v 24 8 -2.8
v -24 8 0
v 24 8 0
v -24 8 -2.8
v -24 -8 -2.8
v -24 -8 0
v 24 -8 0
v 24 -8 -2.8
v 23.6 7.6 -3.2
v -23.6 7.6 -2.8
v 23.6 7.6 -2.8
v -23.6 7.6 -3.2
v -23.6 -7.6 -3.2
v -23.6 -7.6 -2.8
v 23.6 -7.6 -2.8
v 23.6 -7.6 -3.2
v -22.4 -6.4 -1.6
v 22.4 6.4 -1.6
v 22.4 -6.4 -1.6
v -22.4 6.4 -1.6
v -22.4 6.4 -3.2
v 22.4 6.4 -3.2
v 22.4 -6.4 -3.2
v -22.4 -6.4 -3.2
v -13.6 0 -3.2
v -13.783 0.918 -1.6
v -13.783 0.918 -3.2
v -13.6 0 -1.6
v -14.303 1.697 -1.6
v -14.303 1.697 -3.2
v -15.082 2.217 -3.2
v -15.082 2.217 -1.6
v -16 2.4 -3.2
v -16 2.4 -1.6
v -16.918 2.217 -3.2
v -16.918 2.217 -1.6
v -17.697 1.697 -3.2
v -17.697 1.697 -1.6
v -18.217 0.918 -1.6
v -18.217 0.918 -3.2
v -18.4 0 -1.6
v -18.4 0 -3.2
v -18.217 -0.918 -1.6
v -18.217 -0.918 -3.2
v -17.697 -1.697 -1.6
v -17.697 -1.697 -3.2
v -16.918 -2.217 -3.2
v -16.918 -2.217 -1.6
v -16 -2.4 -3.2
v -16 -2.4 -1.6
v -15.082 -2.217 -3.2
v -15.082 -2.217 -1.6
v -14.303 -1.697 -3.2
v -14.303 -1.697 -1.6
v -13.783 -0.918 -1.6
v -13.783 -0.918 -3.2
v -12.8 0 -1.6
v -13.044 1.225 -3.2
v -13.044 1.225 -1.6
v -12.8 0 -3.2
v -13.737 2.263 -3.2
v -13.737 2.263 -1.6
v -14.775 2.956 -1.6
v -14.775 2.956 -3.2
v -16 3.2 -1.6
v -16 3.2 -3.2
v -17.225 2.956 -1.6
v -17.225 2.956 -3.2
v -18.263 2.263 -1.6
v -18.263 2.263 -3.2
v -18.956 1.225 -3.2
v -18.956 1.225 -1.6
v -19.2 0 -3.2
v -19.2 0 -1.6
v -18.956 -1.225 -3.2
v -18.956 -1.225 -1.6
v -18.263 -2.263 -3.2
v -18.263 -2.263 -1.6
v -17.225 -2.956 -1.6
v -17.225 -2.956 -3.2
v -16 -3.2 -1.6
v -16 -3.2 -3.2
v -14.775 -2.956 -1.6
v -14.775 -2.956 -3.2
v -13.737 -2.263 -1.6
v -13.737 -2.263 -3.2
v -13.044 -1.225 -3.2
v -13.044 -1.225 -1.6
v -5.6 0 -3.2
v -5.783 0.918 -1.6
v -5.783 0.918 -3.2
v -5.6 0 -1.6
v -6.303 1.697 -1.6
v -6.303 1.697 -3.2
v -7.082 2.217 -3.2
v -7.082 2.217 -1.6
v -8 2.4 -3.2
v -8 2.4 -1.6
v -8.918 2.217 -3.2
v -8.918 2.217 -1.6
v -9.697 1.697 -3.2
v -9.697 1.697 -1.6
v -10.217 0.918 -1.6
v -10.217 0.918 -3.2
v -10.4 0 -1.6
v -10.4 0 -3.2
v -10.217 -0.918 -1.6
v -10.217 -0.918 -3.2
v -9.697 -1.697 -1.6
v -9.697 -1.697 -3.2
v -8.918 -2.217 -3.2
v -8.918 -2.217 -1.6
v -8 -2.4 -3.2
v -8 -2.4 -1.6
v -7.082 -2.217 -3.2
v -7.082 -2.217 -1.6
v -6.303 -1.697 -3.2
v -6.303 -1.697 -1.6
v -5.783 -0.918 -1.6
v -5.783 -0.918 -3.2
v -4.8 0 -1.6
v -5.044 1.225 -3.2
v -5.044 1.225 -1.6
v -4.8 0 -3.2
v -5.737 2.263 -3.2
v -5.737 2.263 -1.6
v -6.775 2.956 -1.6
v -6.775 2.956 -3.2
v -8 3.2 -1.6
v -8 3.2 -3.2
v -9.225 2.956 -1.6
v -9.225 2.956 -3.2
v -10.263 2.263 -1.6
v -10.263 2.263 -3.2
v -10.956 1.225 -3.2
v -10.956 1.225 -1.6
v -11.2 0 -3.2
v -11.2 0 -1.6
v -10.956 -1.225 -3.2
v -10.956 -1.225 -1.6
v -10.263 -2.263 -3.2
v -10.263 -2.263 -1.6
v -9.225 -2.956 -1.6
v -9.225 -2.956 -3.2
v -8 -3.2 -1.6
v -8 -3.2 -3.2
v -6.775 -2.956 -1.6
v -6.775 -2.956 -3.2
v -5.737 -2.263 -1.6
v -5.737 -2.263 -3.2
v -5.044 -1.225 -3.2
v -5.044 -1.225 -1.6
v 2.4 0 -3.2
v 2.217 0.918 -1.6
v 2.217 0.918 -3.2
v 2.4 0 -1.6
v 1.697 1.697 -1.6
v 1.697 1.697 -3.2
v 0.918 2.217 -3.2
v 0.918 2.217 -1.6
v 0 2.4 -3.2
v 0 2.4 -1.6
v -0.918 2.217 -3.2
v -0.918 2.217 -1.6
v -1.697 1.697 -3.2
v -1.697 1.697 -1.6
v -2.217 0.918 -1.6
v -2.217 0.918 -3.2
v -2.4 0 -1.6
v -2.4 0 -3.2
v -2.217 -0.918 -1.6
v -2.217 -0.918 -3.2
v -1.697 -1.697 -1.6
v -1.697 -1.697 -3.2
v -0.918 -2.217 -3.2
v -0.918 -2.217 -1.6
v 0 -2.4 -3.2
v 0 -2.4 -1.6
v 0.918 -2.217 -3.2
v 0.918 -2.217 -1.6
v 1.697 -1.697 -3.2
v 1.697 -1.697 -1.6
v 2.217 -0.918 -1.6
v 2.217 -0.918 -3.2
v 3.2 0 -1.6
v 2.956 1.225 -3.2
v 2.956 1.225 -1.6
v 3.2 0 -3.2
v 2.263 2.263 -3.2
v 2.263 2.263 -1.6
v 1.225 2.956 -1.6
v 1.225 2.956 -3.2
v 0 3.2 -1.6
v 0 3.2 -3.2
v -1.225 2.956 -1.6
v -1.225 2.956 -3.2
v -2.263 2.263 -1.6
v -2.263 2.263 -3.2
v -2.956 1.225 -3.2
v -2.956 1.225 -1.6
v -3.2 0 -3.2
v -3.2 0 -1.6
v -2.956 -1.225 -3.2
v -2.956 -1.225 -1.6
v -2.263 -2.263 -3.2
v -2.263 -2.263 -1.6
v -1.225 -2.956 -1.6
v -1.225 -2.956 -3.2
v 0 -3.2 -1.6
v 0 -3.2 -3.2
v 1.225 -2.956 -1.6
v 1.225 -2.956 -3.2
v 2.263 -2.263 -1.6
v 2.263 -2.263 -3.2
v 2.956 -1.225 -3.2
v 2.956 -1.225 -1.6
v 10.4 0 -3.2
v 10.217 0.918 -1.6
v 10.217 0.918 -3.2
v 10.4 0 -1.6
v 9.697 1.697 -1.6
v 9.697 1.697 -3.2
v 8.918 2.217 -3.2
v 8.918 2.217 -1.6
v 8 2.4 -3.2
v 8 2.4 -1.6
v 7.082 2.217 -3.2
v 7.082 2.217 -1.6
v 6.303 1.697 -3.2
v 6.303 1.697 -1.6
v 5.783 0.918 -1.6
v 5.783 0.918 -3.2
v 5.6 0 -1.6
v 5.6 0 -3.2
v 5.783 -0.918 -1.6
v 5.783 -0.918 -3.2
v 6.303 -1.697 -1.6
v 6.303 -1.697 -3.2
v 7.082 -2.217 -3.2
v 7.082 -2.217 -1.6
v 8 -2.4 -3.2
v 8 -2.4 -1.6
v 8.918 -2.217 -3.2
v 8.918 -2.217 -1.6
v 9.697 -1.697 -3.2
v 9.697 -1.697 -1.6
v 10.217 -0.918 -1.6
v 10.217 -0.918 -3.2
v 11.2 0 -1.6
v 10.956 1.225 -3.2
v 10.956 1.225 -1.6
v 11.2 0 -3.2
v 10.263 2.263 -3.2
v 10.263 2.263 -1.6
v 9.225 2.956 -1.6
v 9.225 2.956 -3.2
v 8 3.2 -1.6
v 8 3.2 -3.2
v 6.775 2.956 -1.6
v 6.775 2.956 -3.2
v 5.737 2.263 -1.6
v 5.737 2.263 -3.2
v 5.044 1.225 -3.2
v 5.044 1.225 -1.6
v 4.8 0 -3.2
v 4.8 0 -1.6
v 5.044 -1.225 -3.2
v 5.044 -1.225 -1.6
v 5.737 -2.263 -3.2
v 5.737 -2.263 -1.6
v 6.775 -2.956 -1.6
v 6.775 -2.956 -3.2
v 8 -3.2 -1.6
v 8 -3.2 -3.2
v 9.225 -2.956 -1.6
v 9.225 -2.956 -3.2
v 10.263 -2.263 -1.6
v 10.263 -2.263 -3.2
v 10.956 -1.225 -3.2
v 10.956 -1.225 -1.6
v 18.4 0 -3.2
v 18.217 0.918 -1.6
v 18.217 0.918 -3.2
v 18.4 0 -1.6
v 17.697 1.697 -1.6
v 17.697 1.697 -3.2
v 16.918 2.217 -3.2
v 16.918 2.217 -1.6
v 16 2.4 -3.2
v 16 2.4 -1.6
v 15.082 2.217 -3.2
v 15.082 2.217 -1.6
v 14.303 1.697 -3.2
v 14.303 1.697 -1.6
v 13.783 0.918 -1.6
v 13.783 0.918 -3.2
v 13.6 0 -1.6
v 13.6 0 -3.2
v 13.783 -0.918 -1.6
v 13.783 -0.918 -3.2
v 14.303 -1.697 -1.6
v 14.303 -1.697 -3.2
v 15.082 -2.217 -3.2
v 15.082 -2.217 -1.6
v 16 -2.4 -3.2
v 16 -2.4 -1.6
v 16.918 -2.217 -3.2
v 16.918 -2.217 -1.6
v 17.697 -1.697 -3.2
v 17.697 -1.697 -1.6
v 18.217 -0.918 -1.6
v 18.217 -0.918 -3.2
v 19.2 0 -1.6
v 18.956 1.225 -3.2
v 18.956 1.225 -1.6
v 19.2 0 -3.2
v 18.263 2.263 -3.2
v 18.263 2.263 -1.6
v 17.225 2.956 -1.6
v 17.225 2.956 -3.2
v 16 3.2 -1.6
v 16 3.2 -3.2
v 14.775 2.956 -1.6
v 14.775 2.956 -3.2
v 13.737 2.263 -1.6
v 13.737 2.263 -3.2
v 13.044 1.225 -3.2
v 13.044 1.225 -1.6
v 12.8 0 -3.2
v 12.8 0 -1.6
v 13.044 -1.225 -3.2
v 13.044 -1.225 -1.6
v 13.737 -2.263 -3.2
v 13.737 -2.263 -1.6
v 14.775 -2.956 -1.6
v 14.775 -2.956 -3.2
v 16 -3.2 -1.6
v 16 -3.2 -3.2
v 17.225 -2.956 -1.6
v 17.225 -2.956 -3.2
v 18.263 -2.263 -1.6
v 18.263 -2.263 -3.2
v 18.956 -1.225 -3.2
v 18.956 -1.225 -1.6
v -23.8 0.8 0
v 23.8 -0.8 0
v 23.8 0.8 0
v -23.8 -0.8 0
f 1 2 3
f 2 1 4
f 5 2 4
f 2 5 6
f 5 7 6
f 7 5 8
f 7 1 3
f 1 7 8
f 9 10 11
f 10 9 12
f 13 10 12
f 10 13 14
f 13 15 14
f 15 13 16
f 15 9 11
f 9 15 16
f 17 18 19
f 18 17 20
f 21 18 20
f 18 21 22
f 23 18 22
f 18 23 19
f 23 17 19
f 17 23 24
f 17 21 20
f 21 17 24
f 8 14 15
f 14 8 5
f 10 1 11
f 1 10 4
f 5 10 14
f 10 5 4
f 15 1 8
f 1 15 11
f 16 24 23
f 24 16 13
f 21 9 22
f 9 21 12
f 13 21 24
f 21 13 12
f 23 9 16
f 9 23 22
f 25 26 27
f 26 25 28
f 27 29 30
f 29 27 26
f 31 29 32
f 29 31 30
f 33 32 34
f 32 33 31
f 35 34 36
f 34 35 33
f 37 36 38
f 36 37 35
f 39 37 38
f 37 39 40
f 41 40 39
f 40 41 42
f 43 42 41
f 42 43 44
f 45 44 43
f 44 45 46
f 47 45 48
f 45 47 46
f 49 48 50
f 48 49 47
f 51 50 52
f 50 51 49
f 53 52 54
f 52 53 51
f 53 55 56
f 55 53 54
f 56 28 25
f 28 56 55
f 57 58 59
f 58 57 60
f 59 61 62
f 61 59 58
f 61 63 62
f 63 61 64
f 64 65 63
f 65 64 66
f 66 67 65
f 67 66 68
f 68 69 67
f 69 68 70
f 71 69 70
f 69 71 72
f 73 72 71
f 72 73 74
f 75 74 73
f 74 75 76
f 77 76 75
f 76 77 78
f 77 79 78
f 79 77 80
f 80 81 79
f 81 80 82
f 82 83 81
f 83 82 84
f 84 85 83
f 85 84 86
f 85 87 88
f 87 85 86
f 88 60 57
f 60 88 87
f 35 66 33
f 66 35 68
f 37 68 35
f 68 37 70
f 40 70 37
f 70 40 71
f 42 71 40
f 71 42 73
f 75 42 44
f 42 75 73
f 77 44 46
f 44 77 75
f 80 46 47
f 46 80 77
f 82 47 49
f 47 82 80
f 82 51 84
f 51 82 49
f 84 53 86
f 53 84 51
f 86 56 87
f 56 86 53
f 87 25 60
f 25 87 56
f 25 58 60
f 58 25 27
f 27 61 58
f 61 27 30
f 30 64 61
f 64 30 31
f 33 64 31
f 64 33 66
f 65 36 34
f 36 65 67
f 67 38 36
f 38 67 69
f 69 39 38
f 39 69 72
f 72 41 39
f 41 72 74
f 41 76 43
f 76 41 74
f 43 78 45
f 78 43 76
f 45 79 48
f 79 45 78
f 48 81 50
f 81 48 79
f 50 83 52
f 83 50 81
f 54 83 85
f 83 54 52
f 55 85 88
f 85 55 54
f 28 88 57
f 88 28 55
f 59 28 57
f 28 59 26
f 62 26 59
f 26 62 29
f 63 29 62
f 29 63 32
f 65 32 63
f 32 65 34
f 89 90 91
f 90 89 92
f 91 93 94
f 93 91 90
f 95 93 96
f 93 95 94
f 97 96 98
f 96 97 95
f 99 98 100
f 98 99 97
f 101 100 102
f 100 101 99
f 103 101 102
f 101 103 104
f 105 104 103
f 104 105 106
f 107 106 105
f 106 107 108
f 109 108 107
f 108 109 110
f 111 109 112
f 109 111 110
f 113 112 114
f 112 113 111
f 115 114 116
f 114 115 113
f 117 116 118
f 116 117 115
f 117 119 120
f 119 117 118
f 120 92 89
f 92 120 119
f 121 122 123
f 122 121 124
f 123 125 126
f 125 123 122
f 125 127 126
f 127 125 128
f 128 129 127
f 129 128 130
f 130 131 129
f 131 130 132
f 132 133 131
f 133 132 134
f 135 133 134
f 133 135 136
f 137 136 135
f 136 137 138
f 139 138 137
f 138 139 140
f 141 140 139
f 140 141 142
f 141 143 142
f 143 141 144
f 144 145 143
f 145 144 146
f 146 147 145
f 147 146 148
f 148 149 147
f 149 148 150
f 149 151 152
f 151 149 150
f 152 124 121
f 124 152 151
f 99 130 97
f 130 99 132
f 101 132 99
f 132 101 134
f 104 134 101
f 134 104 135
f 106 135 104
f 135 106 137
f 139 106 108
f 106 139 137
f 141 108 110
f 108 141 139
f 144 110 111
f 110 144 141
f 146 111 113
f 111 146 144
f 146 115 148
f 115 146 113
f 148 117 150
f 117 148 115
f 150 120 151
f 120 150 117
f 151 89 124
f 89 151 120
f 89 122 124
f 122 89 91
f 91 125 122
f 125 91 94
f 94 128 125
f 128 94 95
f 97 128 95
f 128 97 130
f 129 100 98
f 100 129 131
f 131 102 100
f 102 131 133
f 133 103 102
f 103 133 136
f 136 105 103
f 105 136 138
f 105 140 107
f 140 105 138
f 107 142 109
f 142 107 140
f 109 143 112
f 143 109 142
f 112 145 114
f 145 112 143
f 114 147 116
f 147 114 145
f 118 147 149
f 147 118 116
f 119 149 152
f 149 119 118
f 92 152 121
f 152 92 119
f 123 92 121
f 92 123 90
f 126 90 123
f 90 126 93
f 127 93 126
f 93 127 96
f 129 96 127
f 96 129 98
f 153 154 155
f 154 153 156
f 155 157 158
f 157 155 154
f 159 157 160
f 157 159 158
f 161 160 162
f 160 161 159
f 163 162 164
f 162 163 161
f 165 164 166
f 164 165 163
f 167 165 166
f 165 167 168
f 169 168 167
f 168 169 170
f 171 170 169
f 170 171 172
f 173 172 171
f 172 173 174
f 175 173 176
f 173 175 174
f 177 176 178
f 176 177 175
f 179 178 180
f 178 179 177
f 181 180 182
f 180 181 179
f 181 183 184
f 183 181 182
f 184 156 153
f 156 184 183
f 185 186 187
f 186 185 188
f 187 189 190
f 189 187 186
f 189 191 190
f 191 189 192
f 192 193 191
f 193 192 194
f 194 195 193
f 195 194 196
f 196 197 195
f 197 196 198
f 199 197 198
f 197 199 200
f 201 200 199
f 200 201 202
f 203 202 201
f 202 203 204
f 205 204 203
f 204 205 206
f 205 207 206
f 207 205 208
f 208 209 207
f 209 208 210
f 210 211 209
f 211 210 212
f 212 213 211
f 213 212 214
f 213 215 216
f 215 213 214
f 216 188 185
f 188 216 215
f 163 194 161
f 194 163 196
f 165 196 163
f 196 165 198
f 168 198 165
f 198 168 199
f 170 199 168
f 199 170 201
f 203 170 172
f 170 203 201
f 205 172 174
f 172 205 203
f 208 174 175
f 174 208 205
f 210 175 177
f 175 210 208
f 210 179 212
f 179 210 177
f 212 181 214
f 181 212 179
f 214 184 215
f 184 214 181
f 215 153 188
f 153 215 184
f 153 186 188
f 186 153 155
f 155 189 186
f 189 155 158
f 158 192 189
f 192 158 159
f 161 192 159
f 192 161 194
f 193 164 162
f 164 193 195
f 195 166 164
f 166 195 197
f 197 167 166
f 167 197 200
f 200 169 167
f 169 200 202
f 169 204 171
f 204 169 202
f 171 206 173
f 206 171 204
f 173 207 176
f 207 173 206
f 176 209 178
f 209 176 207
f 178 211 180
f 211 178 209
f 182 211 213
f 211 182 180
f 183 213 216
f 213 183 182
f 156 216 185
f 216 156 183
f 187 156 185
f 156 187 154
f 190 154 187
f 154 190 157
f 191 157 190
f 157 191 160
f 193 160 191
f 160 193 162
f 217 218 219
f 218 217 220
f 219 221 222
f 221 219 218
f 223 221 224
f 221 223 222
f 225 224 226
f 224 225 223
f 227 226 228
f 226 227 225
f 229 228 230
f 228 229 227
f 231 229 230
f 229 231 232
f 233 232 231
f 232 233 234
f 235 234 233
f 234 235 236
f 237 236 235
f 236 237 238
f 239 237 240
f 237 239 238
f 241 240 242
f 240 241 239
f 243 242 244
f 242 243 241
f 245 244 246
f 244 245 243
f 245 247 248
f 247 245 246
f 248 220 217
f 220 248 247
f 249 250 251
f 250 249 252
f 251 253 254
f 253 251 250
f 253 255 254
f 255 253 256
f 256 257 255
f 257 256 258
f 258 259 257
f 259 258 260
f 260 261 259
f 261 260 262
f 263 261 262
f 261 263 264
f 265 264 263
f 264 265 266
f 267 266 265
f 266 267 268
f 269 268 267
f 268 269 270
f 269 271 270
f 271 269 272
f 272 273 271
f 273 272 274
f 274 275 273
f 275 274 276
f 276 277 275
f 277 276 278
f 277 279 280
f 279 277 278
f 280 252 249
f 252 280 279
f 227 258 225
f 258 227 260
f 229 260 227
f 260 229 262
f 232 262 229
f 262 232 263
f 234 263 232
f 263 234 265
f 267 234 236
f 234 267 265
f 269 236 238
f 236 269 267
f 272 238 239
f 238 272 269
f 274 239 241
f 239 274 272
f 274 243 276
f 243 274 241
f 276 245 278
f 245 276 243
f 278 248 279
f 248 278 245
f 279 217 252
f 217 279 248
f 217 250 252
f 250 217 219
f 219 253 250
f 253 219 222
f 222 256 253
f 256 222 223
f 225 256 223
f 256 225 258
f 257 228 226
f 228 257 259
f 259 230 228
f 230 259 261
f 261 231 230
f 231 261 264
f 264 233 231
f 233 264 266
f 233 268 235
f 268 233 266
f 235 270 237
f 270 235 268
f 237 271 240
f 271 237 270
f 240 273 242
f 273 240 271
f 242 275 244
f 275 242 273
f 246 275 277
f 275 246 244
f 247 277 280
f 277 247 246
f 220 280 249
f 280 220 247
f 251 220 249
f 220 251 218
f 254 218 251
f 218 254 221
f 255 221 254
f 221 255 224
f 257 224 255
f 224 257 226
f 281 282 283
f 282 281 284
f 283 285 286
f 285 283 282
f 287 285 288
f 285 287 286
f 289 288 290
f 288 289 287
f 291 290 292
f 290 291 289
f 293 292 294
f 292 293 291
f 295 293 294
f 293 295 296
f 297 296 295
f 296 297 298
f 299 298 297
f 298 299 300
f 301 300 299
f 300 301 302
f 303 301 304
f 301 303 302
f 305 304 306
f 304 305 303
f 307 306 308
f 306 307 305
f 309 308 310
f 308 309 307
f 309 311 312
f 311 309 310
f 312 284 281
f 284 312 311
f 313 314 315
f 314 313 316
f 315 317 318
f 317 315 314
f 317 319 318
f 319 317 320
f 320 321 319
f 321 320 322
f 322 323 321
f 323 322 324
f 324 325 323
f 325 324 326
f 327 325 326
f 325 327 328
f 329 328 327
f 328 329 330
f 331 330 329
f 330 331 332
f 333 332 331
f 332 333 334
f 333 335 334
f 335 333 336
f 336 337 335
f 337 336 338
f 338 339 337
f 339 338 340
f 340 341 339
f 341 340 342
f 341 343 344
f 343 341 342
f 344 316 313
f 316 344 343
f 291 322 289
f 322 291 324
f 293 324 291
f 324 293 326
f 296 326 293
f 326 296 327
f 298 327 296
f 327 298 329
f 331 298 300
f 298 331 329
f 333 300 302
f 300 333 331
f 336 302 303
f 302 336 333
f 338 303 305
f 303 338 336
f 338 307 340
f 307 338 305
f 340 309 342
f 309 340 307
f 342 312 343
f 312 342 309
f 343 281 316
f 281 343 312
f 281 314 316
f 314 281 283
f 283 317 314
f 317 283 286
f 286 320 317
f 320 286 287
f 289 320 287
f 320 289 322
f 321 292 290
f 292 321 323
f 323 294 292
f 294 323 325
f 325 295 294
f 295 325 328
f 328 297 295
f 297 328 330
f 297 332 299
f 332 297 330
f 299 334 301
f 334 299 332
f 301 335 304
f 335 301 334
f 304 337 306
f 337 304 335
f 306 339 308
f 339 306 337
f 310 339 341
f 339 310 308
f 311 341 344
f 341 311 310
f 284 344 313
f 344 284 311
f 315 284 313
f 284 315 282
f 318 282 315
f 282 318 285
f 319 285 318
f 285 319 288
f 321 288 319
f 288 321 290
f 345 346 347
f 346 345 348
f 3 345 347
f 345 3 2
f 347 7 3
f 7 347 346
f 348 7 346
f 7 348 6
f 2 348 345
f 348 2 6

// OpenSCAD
// file: ../p/4-4ring3.scad
use <../lib.scad>
$fa=1; $fs=0.2;
function ldraw_lib__4_4ring3(realsolid=false) = [
// 0 Ring  3 x 1.0
// 0 Name: 4-4ring3.dat
// 0 Author: James Jessiman
// 0 !LDRAW_ORG Primitive UPDATE 2009-01
// 0 !LICENSE Licensed under CC BY 2.0 and CC BY 4.0 : see CAreadme.txt
// 
// 0 BFC CERTIFY CCW
  [0,"BFC","CERTIFY"],
  [0,"BFC","CCW"],
// 
// 0 !HISTORY 1998-12-15 [PTadmin] Official Update 1998-10
// 0 !HISTORY 2002-04-05 [hafhead] Added BFC statement
// 0 !HISTORY 2002-04-25 [PTadmin] Official Update 2002-02
// 0 !HISTORY 2007-06-24 [PTadmin] Header formatted for Contributor Agreement
// 0 !HISTORY 2008-07-01 [PTadmin] Official Update 2008-01
// 0 !HISTORY 2008-08-26 [cwdee] Switch polygon winding and rename
// 0 !HISTORY 2009-05-02 [PTadmin] Official Update 2009-01
// 
// 
// 4 16 -1.5308 0 3.6956 -1.1481 0 2.7717 0 0 3 0 0 4
  [4,16,-1.5308,0,3.6956,-1.1481,0,2.7717,0,0,3,0,0,4],
// 4 16 -2.8284 0 2.8284 -2.1213 0 2.1213 -1.1481 0 2.7717 -1.5308 0 3.6956
  [4,16,-2.8284,0,2.8284,-2.1213,0,2.1213,-1.1481,0,2.7717,-1.5308,0,3.6956],
// 4 16 -3.6956 0 1.5308 -2.7717 0 1.1481 -2.1213 0 2.1213 -2.8284 0 2.8284
  [4,16,-3.6956,0,1.5308,-2.7717,0,1.1481,-2.1213,0,2.1213,-2.8284,0,2.8284],
// 4 16 -4 0 0 -3 0 0 -2.7717 0 1.1481 -3.6956 0 1.5308
  [4,16,-4,0,0,-3,0,0,-2.7717,0,1.1481,-3.6956,0,1.5308],
// 4 16 -3.6956 0 -1.5308 -2.7717 0 -1.1481 -3 0 0 -4 0 0
  [4,16,-3.6956,0,-1.5308,-2.7717,0,-1.1481,-3,0,0,-4,0,0],
// 4 16 -2.8284 0 -2.8284 -2.1213 0 -2.1213 -2.7717 0 -1.1481 -3.6956 0 -1.5308
  [4,16,-2.8284,0,-2.8284,-2.1213,0,-2.1213,-2.7717,0,-1.1481,-3.6956,0,-1.5308],
// 4 16 -1.5308 0 -3.6956 -1.1481 0 -2.7717 -2.1213 0 -2.1213 -2.8284 0 -2.8284
  [4,16,-1.5308,0,-3.6956,-1.1481,0,-2.7717,-2.1213,0,-2.1213,-2.8284,0,-2.8284],
// 4 16 0 0 -4 0 0 -3 -1.1481 0 -2.7717 -1.5308 0 -3.6956
  [4,16,0,0,-4,0,0,-3,-1.1481,0,-2.7717,-1.5308,0,-3.6956],
// 4 16 1.5308 0 -3.6956 1.1481 0 -2.7717 0 0 -3 0 0 -4
  [4,16,1.5308,0,-3.6956,1.1481,0,-2.7717,0,0,-3,0,0,-4],
// 4 16 2.8284 0 -2.8284 2.1213 0 -2.1213 1.1481 0 -2.7717 1.5308 0 -3.6956
  [4,16,2.8284,0,-2.8284,2.1213,0,-2.1213,1.1481,0,-2.7717,1.5308,0,-3.6956],
// 4 16 3.6956 0 -1.5308 2.7717 0 -1.1481 2.1213 0 -2.1213 2.8284 0 -2.8284
  [4,16,3.6956,0,-1.5308,2.7717,0,-1.1481,2.1213,0,-2.1213,2.8284,0,-2.8284],
// 4 16 4 0 0 3 0 0 2.7717 0 -1.1481 3.6956 0 -1.5308
  [4,16,4,0,0,3,0,0,2.7717,0,-1.1481,3.6956,0,-1.5308],
// 4 16 3.6956 0 1.5308 2.7717 0 1.1481 3 0 0 4 0 0
  [4,16,3.6956,0,1.5308,2.7717,0,1.1481,3,0,0,4,0,0],
// 4 16 2.8284 0 2.8284 2.1213 0 2.1213 2.7717 0 1.1481 3.6956 0 1.5308
  [4,16,2.8284,0,2.8284,2.1213,0,2.1213,2.7717,0,1.1481,3.6956,0,1.5308],
// 4 16 1.5308 0 3.6956 1.1481 0 2.7717 2.1213 0 2.1213 2.8284 0 2.8284
  [4,16,1.5308,0,3.6956,1.1481,0,2.7717,2.1213,0,2.1213,2.8284,0,2.8284],
// 4 16 0 0 4 0 0 3 1.1481 0 2.7717 1.5308 0 3.6956
  [4,16,0,0,4,0,0,3,1.1481,0,2.7717,1.5308,0,3.6956],
// 0
];
module ldraw_lib__4_4ring3(step=0, col=false, unit=2/5, alt=false, line=0.2, solid=!$preview)
    makepoly(ldraw_lib__4_4ring3(solid), step=step, col=col, unit=unit, alt=alt, line=line, solid=solid);
ldraw_lib__4_4ring3(line=0.2);
// file: ../p/4-4edge.scad
use <../lib.scad>
function ldraw_lib__4_4edge() = [
// 0 Circle 1.0
// 0 Name: 4-4edge.dat
// 0 Author: James Jessiman
// 0 !LDRAW_ORG Primitive UPDATE 2017-01
// 0 !LICENSE Licensed under CC BY 2.0 and CC BY 4.0 : see CAreadme.txt
// 
// 0 BFC CERTIFY CCW
  [0,"BFC","CERTIFY"],
  [0,"BFC","CCW"],
// 
// 0 !HISTORY 1998-12-15 [PTadmin] Official Update 1998-10
// 0 !HISTORY 2005-12-28 [PTadmin] Official Update 2005-01
// 0 !HISTORY 2007-06-24 [PTadmin] Header formatted for Contributor Agreement
// 0 !HISTORY 2008-07-01 [PTadmin] Official Update 2008-01
// 0 !HISTORY 2017-01-15 [Steffen] BFCed
// 0 !HISTORY 2017-12-30 [PTadmin] Official Update 2017-01
// 
// 
// 2 24 1 0 0 0.9239 0 0.3827
  [2,24,1,0,0,0.9239,0,0.3827],
// 2 24 0.9239 0 0.3827 0.7071 0 0.7071
  [2,24,0.9239,0,0.3827,0.7071,0,0.7071],
// 2 24 0.7071 0 0.7071 0.3827 0 0.9239
  [2,24,0.7071,0,0.7071,0.3827,0,0.9239],
// 2 24 0.3827 0 0.9239 0 0 1
  [2,24,0.3827,0,0.9239,0,0,1],
// 2 24 0 0 1 -0.3827 0 0.9239
  [2,24,0,0,1,-0.3827,0,0.9239],
// 2 24 -0.3827 0 0.9239 -0.7071 0 0.7071
  [2,24,-0.3827,0,0.9239,-0.7071,0,0.7071],
// 2 24 -0.7071 0 0.7071 -0.9239 0 0.3827
  [2,24,-0.7071,0,0.7071,-0.9239,0,0.3827],
// 2 24 -0.9239 0 0.3827 -1 0 -0
  [2,24,-0.9239,0,0.3827,-1,0,-0],
// 2 24 -1 0 -0 -0.9239 0 -0.3827
  [2,24,-1,0,-0,-0.9239,0,-0.3827],
// 2 24 -0.9239 0 -0.3827 -0.7071 0 -0.7071
  [2,24,-0.9239,0,-0.3827,-0.7071,0,-0.7071],
// 2 24 -0.7071 0 -0.7071 -0.3827 0 -0.9239
  [2,24,-0.7071,0,-0.7071,-0.3827,0,-0.9239],
// 2 24 -0.3827 0 -0.9239 0 0 -1
  [2,24,-0.3827,0,-0.9239,0,0,-1],
// 2 24 0 0 -1 0.3827 0 -0.9239
  [2,24,0,0,-1,0.3827,0,-0.9239],
// 2 24 0.3827 0 -0.9239 0.7071 0 -0.7071
  [2,24,0.3827,0,-0.9239,0.7071,0,-0.7071],
// 2 24 0.7071 0 -0.7071 0.9239 0 -0.3827
  [2,24,0.7071,0,-0.7071,0.9239,0,-0.3827],
// 2 24 0.9239 0 -0.3827 1 0 0
  [2,24,0.9239,0,-0.3827,1,0,0],
];
module ldraw_lib__4_4edge(step=0, col=false, unit=2/5, alt=false, line=0.2, solid=!$preview)
    makepoly(ldraw_lib__4_4edge(), step=step, col=col, unit=unit, alt=alt, line=line, solid=solid);
ldraw_lib__4_4edge(line=0.2);
// file: ../p/4-4cyli.scad
use <../lib.scad>
$fa=1; $fs=0.2;
function ldraw_lib__4_4cyli(realsolid=false) = [
// 0 Cylinder 1.0
// 0 Name: 4-4cyli.dat
// 0 Author: James Jessiman
// 0 !LDRAW_ORG Primitive UPDATE 2005-01
// 0 !LICENSE Licensed under CC BY 2.0 and CC BY 4.0 : see CAreadme.txt
// 
// 0 BFC CERTIFY CCW
  [0,"BFC","CERTIFY"],
  [0,"BFC","CCW"],
// 
// 0 !HISTORY 1998-12-15 [PTadmin] Official Update 1998-10
// 0 !HISTORY 2002-03-23 [sbliss] Added BFC statement; merged headers from files in distributions LDraw 0.27 and Complete.
// 0 !HISTORY 2002-04-25 [PTadmin] Official Update 2002-02
// 0 !HISTORY 2004-12-14 [guyvivan] BFC CCW
// 0 !HISTORY 2005-12-28 [PTadmin] Official Update 2005-01
// 0 !HISTORY 2007-06-24 [PTadmin] Header formatted for Contributor Agreement
// 0 !HISTORY 2008-07-01 [PTadmin] Official Update 2008-01
// 
// 
// 4 16 1 1 0 0.9239 1 0.3827 0.9239 0 0.3827 1 0 0
  [4,16,1,1,0,0.9239,1,0.3827,0.9239,0,0.3827,1,0,0],
// 5 24 1 0 0 1 1 0 0.9239 0 0.3827 0.9239 0 -0.3827
  [5,24,1,0,0,1,1,0,0.9239,0,0.3827,0.9239,0,-0.3827],
// 4 16 0.9239 1 0.3827 0.7071 1 0.7071 0.7071 0 0.7071 0.9239 0 0.3827
  [4,16,0.9239,1,0.3827,0.7071,1,0.7071,0.7071,0,0.7071,0.9239,0,0.3827],
// 5 24 0.9239 0 0.3827 0.9239 1 0.3827 0.7071 0 0.7071 1 0 0
  [5,24,0.9239,0,0.3827,0.9239,1,0.3827,0.7071,0,0.7071,1,0,0],
// 4 16 0.7071 1 0.7071 0.3827 1 0.9239 0.3827 0 0.9239 0.7071 0 0.7071
  [4,16,0.7071,1,0.7071,0.3827,1,0.9239,0.3827,0,0.9239,0.7071,0,0.7071],
// 5 24 0.7071 0 0.7071 0.7071 1 0.7071 0.3827 0 0.9239 0.9239 0 0.3827
  [5,24,0.7071,0,0.7071,0.7071,1,0.7071,0.3827,0,0.9239,0.9239,0,0.3827],
// 4 16 0.3827 1 0.9239 0 1 1 0 0 1 0.3827 0 0.9239
  [4,16,0.3827,1,0.9239,0,1,1,0,0,1,0.3827,0,0.9239],
// 5 24 0.3827 0 0.9239 0.3827 1 0.9239 0 0 1 0.7071 0 0.7071
  [5,24,0.3827,0,0.9239,0.3827,1,0.9239,0,0,1,0.7071,0,0.7071],
// 4 16 0 1 1 -0.3827 1 0.9239 -0.3827 0 0.9239 0 0 1
  [4,16,0,1,1,-0.3827,1,0.9239,-0.3827,0,0.9239,0,0,1],
// 5 24 0 0 1 0 1 1 -0.3827 0 0.9239 0.3827 0 0.9239
  [5,24,0,0,1,0,1,1,-0.3827,0,0.9239,0.3827,0,0.9239],
// 4 16 -0.3827 1 0.9239 -0.7071 1 0.7071 -0.7071 0 0.7071 -0.3827 0 0.9239
  [4,16,-0.3827,1,0.9239,-0.7071,1,0.7071,-0.7071,0,0.7071,-0.3827,0,0.9239],
// 5 24 -0.3827 0 0.9239 -0.3827 1 0.9239 -0.7071 0 0.7071 0 0 1
  [5,24,-0.3827,0,0.9239,-0.3827,1,0.9239,-0.7071,0,0.7071,0,0,1],
// 4 16 -0.7071 1 0.7071 -0.9239 1 0.3827 -0.9239 0 0.3827 -0.7071 0 0.7071
  [4,16,-0.7071,1,0.7071,-0.9239,1,0.3827,-0.9239,0,0.3827,-0.7071,0,0.7071],
// 5 24 -0.7071 0 0.7071 -0.7071 1 0.7071 -0.9239 0 0.3827 -0.3827 0 0.9239
  [5,24,-0.7071,0,0.7071,-0.7071,1,0.7071,-0.9239,0,0.3827,-0.3827,0,0.9239],
// 4 16 -0.9239 1 0.3827 -1 1 0 -1 0 0 -0.9239 0 0.3827
  [4,16,-0.9239,1,0.3827,-1,1,0,-1,0,0,-0.9239,0,0.3827],
// 5 24 -0.9239 0 0.3827 -0.9239 1 0.3827 -1 0 0 -0.7071 0 0.7071
  [5,24,-0.9239,0,0.3827,-0.9239,1,0.3827,-1,0,0,-0.7071,0,0.7071],
// 4 16 -1 1 0 -0.9239 1 -0.3827 -0.9239 0 -0.3827 -1 0 0
  [4,16,-1,1,0,-0.9239,1,-0.3827,-0.9239,0,-0.3827,-1,0,0],
// 5 24 -1 0 0 -1 1 0 -0.9239 0 -0.3827 -0.9239 0 0.3827
  [5,24,-1,0,0,-1,1,0,-0.9239,0,-0.3827,-0.9239,0,0.3827],
// 4 16 -0.9239 1 -0.3827 -0.7071 1 -0.7071 -0.7071 0 -0.7071 -0.9239 0 -0.3827
  [4,16,-0.9239,1,-0.3827,-0.7071,1,-0.7071,-0.7071,0,-0.7071,-0.9239,0,-0.3827],
// 5 24 -0.9239 0 -0.3827 -0.9239 1 -0.3827 -0.7071 0 -0.7071 -1 0 0
  [5,24,-0.9239,0,-0.3827,-0.9239,1,-0.3827,-0.7071,0,-0.7071,-1,0,0],
// 4 16 -0.7071 1 -0.7071 -0.3827 1 -0.9239 -0.3827 0 -0.9239 -0.7071 0 -0.7071
  [4,16,-0.7071,1,-0.7071,-0.3827,1,-0.9239,-0.3827,0,-0.9239,-0.7071,0,-0.7071],
// 5 24 -0.7071 0 -0.7071 -0.7071 1 -0.7071 -0.3827 0 -0.9239 -0.9239 0 -0.3827
  [5,24,-0.7071,0,-0.7071,-0.7071,1,-0.7071,-0.3827,0,-0.9239,-0.9239,0,-0.3827],
// 4 16 -0.3827 1 -0.9239 0 1 -1 0 0 -1 -0.3827 0 -0.9239
  [4,16,-0.3827,1,-0.9239,0,1,-1,0,0,-1,-0.3827,0,-0.9239],
// 5 24 -0.3827 0 -0.9239 -0.3827 1 -0.9239 0 0 -1 -0.7071 0 -0.7071
  [5,24,-0.3827,0,-0.9239,-0.3827,1,-0.9239,0,0,-1,-0.7071,0,-0.7071],
// 4 16 0 1 -1 0.3827 1 -0.9239 0.3827 0 -0.9239 0 0 -1
  [4,16,0,1,-1,0.3827,1,-0.9239,0.3827,0,-0.9239,0,0,-1],
// 5 24 0 0 -1 0 1 -1 0.3827 0 -0.9239 -0.3827 0 -0.9239
  [5,24,0,0,-1,0,1,-1,0.3827,0,-0.9239,-0.3827,0,-0.9239],
// 4 16 0.3827 1 -0.9239 0.7071 1 -0.7071 0.7071 0 -0.7071 0.3827 0 -0.9239
  [4,16,0.3827,1,-0.9239,0.7071,1,-0.7071,0.7071,0,-0.7071,0.3827,0,-0.9239],
// 5 24 0.3827 0 -0.9239 0.3827 1 -0.9239 0.7071 0 -0.7071 0 0 -1
  [5,24,0.3827,0,-0.9239,0.3827,1,-0.9239,0.7071,0,-0.7071,0,0,-1],
// 4 16 0.7071 1 -0.7071 0.9239 1 -0.3827 0.9239 0 -0.3827 0.7071 0 -0.7071
  [4,16,0.7071,1,-0.7071,0.9239,1,-0.3827,0.9239,0,-0.3827,0.7071,0,-0.7071],
// 5 24 0.7071 0 -0.7071 0.7071 1 -0.7071 0.9239 0 -0.3827 0.3827 0 -0.9239
  [5,24,0.7071,0,-0.7071,0.7071,1,-0.7071,0.9239,0,-0.3827,0.3827,0,-0.9239],
// 4 16 0.9239 1 -0.3827 1 1 0 1 0 0 0.9239 0 -0.3827
  [4,16,0.9239,1,-0.3827,1,1,0,1,0,0,0.9239,0,-0.3827],
// 5 24 0.9239 0 -0.3827 0.9239 1 -0.3827 1 0 0 0.7071 0 -0.7071
  [5,24,0.9239,0,-0.3827,0.9239,1,-0.3827,1,0,0,0.7071,0,-0.7071],
// 0
];
module ldraw_lib__4_4cyli(step=0, col=false, unit=2/5, alt=false, line=0.2, solid=!$preview)
    makepoly(ldraw_lib__4_4cyli(solid), step=step, col=col, unit=unit, alt=alt, line=line, solid=solid);
ldraw_lib__4_4cyli(line=0.2);
// file: ../p/stud4.scad
use <../lib.scad>
use <4-4cyli.scad>
use <4-4edge.scad>
use <4-4ring3.scad>
function ldraw_lib__stud4() = [
// 0 Stud Tube Open
// 0 Name: stud4.dat
// 0 Author: James Jessiman
// 0 !LDRAW_ORG Primitive UPDATE 2009-02
// 0 !LICENSE Licensed under CC BY 4.0 : see CAreadme.txt
// 
// 0 BFC CERTIFY CCW
  [0,"BFC","CERTIFY"],
  [0,"BFC","CCW"],
// 
// 0 !HISTORY 1999-07-05 [PTadmin] Official Update 1999-05
// 0 !HISTORY 2002-04-04 [sbliss] Modified for BFC compliance
// 0 !HISTORY 2002-04-25 [PTadmin] Official Update 2002-02
// 0 !HISTORY 2007-06-24 [PTadmin] Header formatted for Contributor Agreement
// 0 !HISTORY 2008-07-01 [PTadmin] Official Update 2008-01
// 0 !HISTORY 2009-06-21 [cwdee] Update ring references to 4-4ring
// 0 !HISTORY 2009-09-03 [PTadmin] Official Update 2009-02
// 
// 
// 1 16 0 -4 0 6 0 0 0 1 0 0 0 6 4-4edge.dat
  [1,16,0,-4,0,6,0,0,0,1,0,0,0,6, ldraw_lib__4_4edge()],
// 1 16 0 -4 0 8 0 0 0 1 0 0 0 8 4-4edge.dat
  [1,16,0,-4,0,8,0,0,0,1,0,0,0,8, ldraw_lib__4_4edge()],
// 1 16 0 0 0 6 0 0 0 1 0 0 0 6 4-4edge.dat
  [1,16,0,0,0,6,0,0,0,1,0,0,0,6, ldraw_lib__4_4edge()],
// 1 16 0 0 0 8 0 0 0 1 0 0 0 8 4-4edge.dat
  [1,16,0,0,0,8,0,0,0,1,0,0,0,8, ldraw_lib__4_4edge()],
// 0 BFC INVERTNEXT
  [0,"BFC","INVERTNEXT"],
// 1 16 0 -4 0 6 0 0 0 4 0 0 0 6 4-4cyli.dat
  [1,16,0,-4,0,6,0,0,0,4,0,0,0,6, ldraw_lib__4_4cyli()],
// 1 16 0 -4 0 8 0 0 0 4 0 0 0 8 4-4cyli.dat
  [1,16,0,-4,0,8,0,0,0,4,0,0,0,8, ldraw_lib__4_4cyli()],
// 1 16 0 -4 0 2 0 0 0 1 0 0 0 2 4-4ring3.dat
  [1,16,0,-4,0,2,0,0,0,1,0,0,0,2, ldraw_lib__4_4ring3()],
  [-1,16,0,0,0,2,0,0,0,-1,0,0,0,2, ldraw_lib__4_4ring3()],
// 0
];
module ldraw_lib__stud4(step=0, col=false, unit=2/5, alt=false, line=0.2, solid=!$preview)
    makepoly(ldraw_lib__stud4(), step=step, col=col, unit=unit, alt=alt, line=line, solid=solid);
ldraw_lib__stud4(line=0.2);
// file: ../p/stug4-1x5.scad
use <../lib.scad>
use <stud4.scad>
function ldraw_lib__stug4_1x5() = [
// 0 Stud Tube Open Group  1 x  5
// 0 Name: stug4-1x5.dat
// 0 Author: Steffen [Steffen]
// 0 !LDRAW_ORG Primitive UPDATE 2011-01
// 0 !LICENSE Licensed under CC BY 2.0 and CC BY 4.0 : see CAreadme.txt
// 
// 0 BFC CERTIFY CCW
  [0,"BFC","CERTIFY"],
  [0,"BFC","CCW"],
// 
// 0 !HISTORY 2011-07-25 [PTadmin] Official Update 2011-01
// 
// 
// 1 16 -40 0 0 1 0 0 0 1 0 0 0 1 stud4.dat
  [1,16,-40,0,0,1,0,0,0,1,0,0,0,1, ldraw_lib__stud4()],
// 1 16 -20 0 0 1 0 0 0 1 0 0 0 1 stud4.dat
  [1,16,-20,0,0,1,0,0,0,1,0,0,0,1, ldraw_lib__stud4()],
// 1 16 0 0 0 1 0 0 0 1 0 0 0 1 stud4.dat
  [1,16,0,0,0,1,0,0,0,1,0,0,0,1, ldraw_lib__stud4()],
// 1 16 20 0 0 1 0 0 0 1 0 0 0 1 stud4.dat
  [1,16,20,0,0,1,0,0,0,1,0,0,0,1, ldraw_lib__stud4()],
// 1 16 40 0 0 1 0 0 0 1 0 0 0 1 stud4.dat
  [1,16,40,0,0,1,0,0,0,1,0,0,0,1, ldraw_lib__stud4()],
];
module ldraw_lib__stug4_1x5(step=0, col=false, unit=2/5, alt=false, line=0.2, solid=!$preview)
    makepoly(ldraw_lib__stug4_1x5(), step=step, col=col, unit=unit, alt=alt, line=line, solid=solid);
ldraw_lib__stug4_1x5(line=0.2);
// file: ../p/box5.scad
use <../lib.scad>
function ldraw_lib__box5() = [
// 0 Box with 5 Faces and All Edges
// 0 Name: box5.dat
// 0 Author: James Jessiman
// 0 !LDRAW_ORG Primitive UPDATE 2012-01
// 0 !LICENSE Licensed under CC BY 2.0 and CC BY 4.0 : see CAreadme.txt
// 
// 0 BFC CERTIFY CCW
  [0,"BFC","CERTIFY"],
  [0,"BFC","CCW"],
// 
// 0 !HISTORY 2002-04-03 [sbliss] Modified for BFC compliance
// 0 !HISTORY 2002-04-25 [PTadmin] Official Update 2002-02
// 0 !HISTORY 2007-06-24 [PTadmin] Header formatted for Contributor Agreement
// 0 !HISTORY 2008-07-01 [PTadmin] Official Update 2008-01
// 0 !HISTORY 2012-02-16 [Philo] Changed to CCW
// 0 !HISTORY 2012-03-30 [PTadmin] Official Update 2012-01
// 
// 
// 2 24 1 1 1 -1 1 1
  [2,24,1,1,1,-1,1,1],
// 2 24 -1 1 1 -1 1 -1
  [2,24,-1,1,1,-1,1,-1],
// 2 24 -1 1 -1 1 1 -1
  [2,24,-1,1,-1,1,1,-1],
// 2 24 1 1 -1 1 1 1
  [2,24,1,1,-1,1,1,1],
// 2 24 1 0 1 -1 0 1
  [2,24,1,0,1,-1,0,1],
// 2 24 -1 0 1 -1 0 -1
  [2,24,-1,0,1,-1,0,-1],
// 2 24 -1 0 -1 1 0 -1
  [2,24,-1,0,-1,1,0,-1],
// 2 24 1 0 -1 1 0 1
  [2,24,1,0,-1,1,0,1],
// 2 24 1 0 1 1 1 1
  [2,24,1,0,1,1,1,1],
// 2 24 -1 0 1 -1 1 1
  [2,24,-1,0,1,-1,1,1],
// 2 24 1 0 -1 1 1 -1
  [2,24,1,0,-1,1,1,-1],
// 2 24 -1 0 -1 -1 1 -1
  [2,24,-1,0,-1,-1,1,-1],
// 4 16 -1 1 1 1 1 1 1 1 -1 -1 1 -1
  [4,16,-1,1,1,1,1,1,1,1,-1,-1,1,-1],
// 4 16 -1 1 1 -1 0 1 1 0 1 1 1 1
  [4,16,-1,1,1,-1,0,1,1,0,1,1,1,1],
// 4 16 -1 1 -1 -1 0 -1 -1 0 1 -1 1 1
  [4,16,-1,1,-1,-1,0,-1,-1,0,1,-1,1,1],
// 4 16 1 1 -1 1 0 -1 -1 0 -1 -1 1 -1
  [4,16,1,1,-1,1,0,-1,-1,0,-1,-1,1,-1],
// 4 16 1 1 1 1 0 1 1 0 -1 1 1 -1
  [4,16,1,1,1,1,0,1,1,0,-1,1,1,-1],
];
makepoly(ldraw_lib__box5(), line=0.2);
// file: ../p/box4.scad
use <../lib.scad>
function ldraw_lib__box4() = [
// 0 Box with 4 Faces (2 Parallel Pairs) and All Edges
// 0 Name: box4.dat
// 0 Author: James Jessiman
// 0 !LDRAW_ORG Primitive UPDATE 2012-01
// 0 !LICENSE Licensed under CC BY 4.0 : see CAreadme.txt
// 
// 0 BFC CERTIFY CCW
  [0,"BFC","CERTIFY"],
  [0,"BFC","CCW"],
// 
// 0 !HISTORY 2002-04-03 [sbliss] Modified for BFC compliance
// 0 !HISTORY 2002-04-25 [PTadmin] Official Update 2002-02
// 0 !HISTORY 2007-06-24 [PTadmin] Header formatted for Contributor Agreement
// 0 !HISTORY 2008-07-01 [PTadmin] Official Update 2008-01
// 0 !HISTORY 2012-02-16 [Philo] Changed to CCW
// 0 !HISTORY 2012-03-30 [PTadmin] Official Update 2012-01
// 
// 
// 2 24 1 1 1 -1 1 1
  [2,24,1,1,1,-1,1,1],
// 2 24 -1 1 1 -1 1 -1
  [2,24,-1,1,1,-1,1,-1],
// 2 24 -1 1 -1 1 1 -1
  [2,24,-1,1,-1,1,1,-1],
// 2 24 1 1 -1 1 1 1
  [2,24,1,1,-1,1,1,1],
// 2 24 1 0 1 -1 0 1
  [2,24,1,0,1,-1,0,1],
// 2 24 -1 0 1 -1 0 -1
  [2,24,-1,0,1,-1,0,-1],
// 2 24 -1 0 -1 1 0 -1
  [2,24,-1,0,-1,1,0,-1],
// 2 24 1 0 -1 1 0 1
  [2,24,1,0,-1,1,0,1],
// 2 24 1 0 1 1 1 1
  [2,24,1,0,1,1,1,1],
// 2 24 -1 0 1 -1 1 1
  [2,24,-1,0,1,-1,1,1],
// 2 24 1 0 -1 1 1 -1
  [2,24,1,0,-1,1,1,-1],
// 2 24 -1 0 -1 -1 1 -1
  [2,24,-1,0,-1,-1,1,-1],
// 4 16 -1 1 1 -1 0 1 1 0 1 1 1 1
  [4,16,-1,1,1,-1,0,1,1,0,1,1,1,1],
// 4 16 -1 1 -1 -1 0 -1 -1 0 1 -1 1 1
  [4,16,-1,1,-1,-1,0,-1,-1,0,1,-1,1,1],
// 4 16 1 1 -1 1 0 -1 -1 0 -1 -1 1 -1
  [4,16,1,1,-1,1,0,-1,-1,0,-1,-1,1,-1],
// 4 16 1 1 1 1 0 1 1 0 -1 1 1 -1
  [4,16,1,1,1,1,0,1,1,0,-1,1,1,-1],
];
module ldraw_lib__box4(step=0, col=false, unit=2/5, alt=false, line=0.2, solid=!$preview)
    makepoly(ldraw_lib__box4(), step=step, col=col, unit=unit, alt=alt, line=line, solid=solid);
ldraw_lib__box4(line=0.2);
// file: s/69729s01.scad
use <../../lib.scad>
use <../../p/box4.scad>
use <../../p/box5.scad>
use <../../p/stug4-1x5.scad>
function ldraw_lib__s__69729s01() = [
// 0 ~Tile  2 x  6 without Top
// 0 Name: s\69729s01.dat
// 0 Author: Vincent Messenet [Cheenzo]
// 0 !LDRAW_ORG Subpart UPDATE 2020-03
// 0 !LICENSE Licensed under CC BY 2.0 and CC BY 4.0 : see CAreadme.txt
// 
// 0 BFC CERTIFY CCW
  [0,"BFC","CERTIFY"],
  [0,"BFC","CCW"],
// 
// 0 !HISTORY 2020-12-29 [PTadmin] Official Update 2020-03
// 
// 
// 1 16 0 0 0 60 0 0 0 7 0 0 0 20 box4.dat
  [1,16,0,0,0,60,0,0,0,7,0,0,0,20, ldraw_lib__box4()],
// 1 16 0 7 0 59 0 0 0 1 0 0 0 19 box4.dat
  [1,16,0,7,0,59,0,0,0,1,0,0,0,19, ldraw_lib__box4()],
// 0 BFC INVERTNEXT
  [0,"BFC","INVERTNEXT"],
// 1 16 0 8 0 -56 0 0 0 -4 0 0 0 16 box5.dat
  [1,16,0,8,0,-56,0,0,0,-4,0,0,0,16, ldraw_lib__box5()],
// 4 16 -60 7 -20 -59 7 -19 59 7 -19 60 7 -20
  [4,16,-60,7,-20,-59,7,-19,59,7,-19,60,7,-20],
// 4 16 60 7 20 59 7 19 -59 7 19 -60 7 20
  [4,16,60,7,20,59,7,19,-59,7,19,-60,7,20],
// 4 16 -60 7 -20 -60 7 20 -59 7 19 -59 7 -19
  [4,16,-60,7,-20,-60,7,20,-59,7,19,-59,7,-19],
// 4 16 60 7 20 60 7 -20 59 7 -19 59 7 19
  [4,16,60,7,20,60,7,-20,59,7,-19,59,7,19],
// 4 16 -59 8 -19 -56 8 -16 56 8 -16 59 8 -19
  [4,16,-59,8,-19,-56,8,-16,56,8,-16,59,8,-19],
// 4 16 59 8 19 56 8 16 -56 8 16 -59 8 19
  [4,16,59,8,19,56,8,16,-56,8,16,-59,8,19],
// 4 16 -59 8 -19 -59 8 19 -56 8 16 -56 8 -16
  [4,16,-59,8,-19,-59,8,19,-56,8,16,-56,8,-16],
// 4 16 59 8 19 59 8 -19 56 8 -16 56 8 16
  [4,16,59,8,19,59,8,-19,56,8,-16,56,8,16],
// 1 16 0 4 0 1 0 0 0 -1 0 0 0 1 stug4-1x5.dat
  [1,16,0,4,0,1,0,0,0,-1,0,0,0,1, ldraw_lib__stug4_1x5()],
];
makepoly(ldraw_lib__s__69729s01(), line=0.2);
// main file
use <../lib.scad>
use <s/69729s01.scad>
function ldraw_lib__69729p01() = [
// 0 Tile  2 x  6 with Metallic Silver Stripe Pattern
// 0 Name: 69729p01.dat
// 0 Author: Vincent Messenet [Cheenzo]
// 0 !LDRAW_ORG Part UPDATE 2024-07
// 0 !LICENSE Licensed under CC BY 4.0 : see CAreadme.txt
// 
// 0 BFC CERTIFY CCW
  [0,"BFC","CERTIFY"],
  [0,"BFC","CCW"],
// 
// 0 !KEYWORDS Bricklink 69729pb088, Rebrickable 69729pr0026, Set 10321
// 
// 0 !HISTORY 2024-08-26 [OrionP] Official Update 2024-07
// 
// 1 16 0 0 0 1 0 0 0 1 0 0 0 1 s\69729s01.dat
  [1,16,0,0,0,1,0,0,0,1,0,0,0,1, ldraw_lib__s__69729s01()],
// 
// 4 80 -59.5 0 -2 59.5 0 -2 59.5 0 2 -59.5 0 2
  [4,80,-59.5,0,-2,59.5,0,-2,59.5,0,2,-59.5,0,2],
// 4 16 59.5 0 2 60 0 20 -60 0 20 -59.5 0 2
  [4,16,59.5,0,2,60,0,20,-60,0,20,-59.5,0,2],
// 4 16 60 0 -20 60 0 20 59.5 0 2 59.5 0 -2
  [4,16,60,0,-20,60,0,20,59.5,0,2,59.5,0,-2],
// 4 16 60 0 -20 59.5 0 -2 -59.5 0 -2 -60 0 -20
  [4,16,60,0,-20,59.5,0,-2,-59.5,0,-2,-60,0,-20],
// 4 16 -59.5 0 2 -60 0 20 -60 0 -20 -59.5 0 -2
  [4,16,-59.5,0,2,-60,0,20,-60,0,-20,-59.5,0,-2],
];
module ldraw_lib__69729p01(step=0, col=false, unit=2/5, alt=false, line=0.2, solid=!$preview)
    makepoly(ldraw_lib__69729p01(), step=step, col=col, unit=unit, alt=alt, line=line, solid=solid);
ldraw_lib__69729p01(line=0.2);
